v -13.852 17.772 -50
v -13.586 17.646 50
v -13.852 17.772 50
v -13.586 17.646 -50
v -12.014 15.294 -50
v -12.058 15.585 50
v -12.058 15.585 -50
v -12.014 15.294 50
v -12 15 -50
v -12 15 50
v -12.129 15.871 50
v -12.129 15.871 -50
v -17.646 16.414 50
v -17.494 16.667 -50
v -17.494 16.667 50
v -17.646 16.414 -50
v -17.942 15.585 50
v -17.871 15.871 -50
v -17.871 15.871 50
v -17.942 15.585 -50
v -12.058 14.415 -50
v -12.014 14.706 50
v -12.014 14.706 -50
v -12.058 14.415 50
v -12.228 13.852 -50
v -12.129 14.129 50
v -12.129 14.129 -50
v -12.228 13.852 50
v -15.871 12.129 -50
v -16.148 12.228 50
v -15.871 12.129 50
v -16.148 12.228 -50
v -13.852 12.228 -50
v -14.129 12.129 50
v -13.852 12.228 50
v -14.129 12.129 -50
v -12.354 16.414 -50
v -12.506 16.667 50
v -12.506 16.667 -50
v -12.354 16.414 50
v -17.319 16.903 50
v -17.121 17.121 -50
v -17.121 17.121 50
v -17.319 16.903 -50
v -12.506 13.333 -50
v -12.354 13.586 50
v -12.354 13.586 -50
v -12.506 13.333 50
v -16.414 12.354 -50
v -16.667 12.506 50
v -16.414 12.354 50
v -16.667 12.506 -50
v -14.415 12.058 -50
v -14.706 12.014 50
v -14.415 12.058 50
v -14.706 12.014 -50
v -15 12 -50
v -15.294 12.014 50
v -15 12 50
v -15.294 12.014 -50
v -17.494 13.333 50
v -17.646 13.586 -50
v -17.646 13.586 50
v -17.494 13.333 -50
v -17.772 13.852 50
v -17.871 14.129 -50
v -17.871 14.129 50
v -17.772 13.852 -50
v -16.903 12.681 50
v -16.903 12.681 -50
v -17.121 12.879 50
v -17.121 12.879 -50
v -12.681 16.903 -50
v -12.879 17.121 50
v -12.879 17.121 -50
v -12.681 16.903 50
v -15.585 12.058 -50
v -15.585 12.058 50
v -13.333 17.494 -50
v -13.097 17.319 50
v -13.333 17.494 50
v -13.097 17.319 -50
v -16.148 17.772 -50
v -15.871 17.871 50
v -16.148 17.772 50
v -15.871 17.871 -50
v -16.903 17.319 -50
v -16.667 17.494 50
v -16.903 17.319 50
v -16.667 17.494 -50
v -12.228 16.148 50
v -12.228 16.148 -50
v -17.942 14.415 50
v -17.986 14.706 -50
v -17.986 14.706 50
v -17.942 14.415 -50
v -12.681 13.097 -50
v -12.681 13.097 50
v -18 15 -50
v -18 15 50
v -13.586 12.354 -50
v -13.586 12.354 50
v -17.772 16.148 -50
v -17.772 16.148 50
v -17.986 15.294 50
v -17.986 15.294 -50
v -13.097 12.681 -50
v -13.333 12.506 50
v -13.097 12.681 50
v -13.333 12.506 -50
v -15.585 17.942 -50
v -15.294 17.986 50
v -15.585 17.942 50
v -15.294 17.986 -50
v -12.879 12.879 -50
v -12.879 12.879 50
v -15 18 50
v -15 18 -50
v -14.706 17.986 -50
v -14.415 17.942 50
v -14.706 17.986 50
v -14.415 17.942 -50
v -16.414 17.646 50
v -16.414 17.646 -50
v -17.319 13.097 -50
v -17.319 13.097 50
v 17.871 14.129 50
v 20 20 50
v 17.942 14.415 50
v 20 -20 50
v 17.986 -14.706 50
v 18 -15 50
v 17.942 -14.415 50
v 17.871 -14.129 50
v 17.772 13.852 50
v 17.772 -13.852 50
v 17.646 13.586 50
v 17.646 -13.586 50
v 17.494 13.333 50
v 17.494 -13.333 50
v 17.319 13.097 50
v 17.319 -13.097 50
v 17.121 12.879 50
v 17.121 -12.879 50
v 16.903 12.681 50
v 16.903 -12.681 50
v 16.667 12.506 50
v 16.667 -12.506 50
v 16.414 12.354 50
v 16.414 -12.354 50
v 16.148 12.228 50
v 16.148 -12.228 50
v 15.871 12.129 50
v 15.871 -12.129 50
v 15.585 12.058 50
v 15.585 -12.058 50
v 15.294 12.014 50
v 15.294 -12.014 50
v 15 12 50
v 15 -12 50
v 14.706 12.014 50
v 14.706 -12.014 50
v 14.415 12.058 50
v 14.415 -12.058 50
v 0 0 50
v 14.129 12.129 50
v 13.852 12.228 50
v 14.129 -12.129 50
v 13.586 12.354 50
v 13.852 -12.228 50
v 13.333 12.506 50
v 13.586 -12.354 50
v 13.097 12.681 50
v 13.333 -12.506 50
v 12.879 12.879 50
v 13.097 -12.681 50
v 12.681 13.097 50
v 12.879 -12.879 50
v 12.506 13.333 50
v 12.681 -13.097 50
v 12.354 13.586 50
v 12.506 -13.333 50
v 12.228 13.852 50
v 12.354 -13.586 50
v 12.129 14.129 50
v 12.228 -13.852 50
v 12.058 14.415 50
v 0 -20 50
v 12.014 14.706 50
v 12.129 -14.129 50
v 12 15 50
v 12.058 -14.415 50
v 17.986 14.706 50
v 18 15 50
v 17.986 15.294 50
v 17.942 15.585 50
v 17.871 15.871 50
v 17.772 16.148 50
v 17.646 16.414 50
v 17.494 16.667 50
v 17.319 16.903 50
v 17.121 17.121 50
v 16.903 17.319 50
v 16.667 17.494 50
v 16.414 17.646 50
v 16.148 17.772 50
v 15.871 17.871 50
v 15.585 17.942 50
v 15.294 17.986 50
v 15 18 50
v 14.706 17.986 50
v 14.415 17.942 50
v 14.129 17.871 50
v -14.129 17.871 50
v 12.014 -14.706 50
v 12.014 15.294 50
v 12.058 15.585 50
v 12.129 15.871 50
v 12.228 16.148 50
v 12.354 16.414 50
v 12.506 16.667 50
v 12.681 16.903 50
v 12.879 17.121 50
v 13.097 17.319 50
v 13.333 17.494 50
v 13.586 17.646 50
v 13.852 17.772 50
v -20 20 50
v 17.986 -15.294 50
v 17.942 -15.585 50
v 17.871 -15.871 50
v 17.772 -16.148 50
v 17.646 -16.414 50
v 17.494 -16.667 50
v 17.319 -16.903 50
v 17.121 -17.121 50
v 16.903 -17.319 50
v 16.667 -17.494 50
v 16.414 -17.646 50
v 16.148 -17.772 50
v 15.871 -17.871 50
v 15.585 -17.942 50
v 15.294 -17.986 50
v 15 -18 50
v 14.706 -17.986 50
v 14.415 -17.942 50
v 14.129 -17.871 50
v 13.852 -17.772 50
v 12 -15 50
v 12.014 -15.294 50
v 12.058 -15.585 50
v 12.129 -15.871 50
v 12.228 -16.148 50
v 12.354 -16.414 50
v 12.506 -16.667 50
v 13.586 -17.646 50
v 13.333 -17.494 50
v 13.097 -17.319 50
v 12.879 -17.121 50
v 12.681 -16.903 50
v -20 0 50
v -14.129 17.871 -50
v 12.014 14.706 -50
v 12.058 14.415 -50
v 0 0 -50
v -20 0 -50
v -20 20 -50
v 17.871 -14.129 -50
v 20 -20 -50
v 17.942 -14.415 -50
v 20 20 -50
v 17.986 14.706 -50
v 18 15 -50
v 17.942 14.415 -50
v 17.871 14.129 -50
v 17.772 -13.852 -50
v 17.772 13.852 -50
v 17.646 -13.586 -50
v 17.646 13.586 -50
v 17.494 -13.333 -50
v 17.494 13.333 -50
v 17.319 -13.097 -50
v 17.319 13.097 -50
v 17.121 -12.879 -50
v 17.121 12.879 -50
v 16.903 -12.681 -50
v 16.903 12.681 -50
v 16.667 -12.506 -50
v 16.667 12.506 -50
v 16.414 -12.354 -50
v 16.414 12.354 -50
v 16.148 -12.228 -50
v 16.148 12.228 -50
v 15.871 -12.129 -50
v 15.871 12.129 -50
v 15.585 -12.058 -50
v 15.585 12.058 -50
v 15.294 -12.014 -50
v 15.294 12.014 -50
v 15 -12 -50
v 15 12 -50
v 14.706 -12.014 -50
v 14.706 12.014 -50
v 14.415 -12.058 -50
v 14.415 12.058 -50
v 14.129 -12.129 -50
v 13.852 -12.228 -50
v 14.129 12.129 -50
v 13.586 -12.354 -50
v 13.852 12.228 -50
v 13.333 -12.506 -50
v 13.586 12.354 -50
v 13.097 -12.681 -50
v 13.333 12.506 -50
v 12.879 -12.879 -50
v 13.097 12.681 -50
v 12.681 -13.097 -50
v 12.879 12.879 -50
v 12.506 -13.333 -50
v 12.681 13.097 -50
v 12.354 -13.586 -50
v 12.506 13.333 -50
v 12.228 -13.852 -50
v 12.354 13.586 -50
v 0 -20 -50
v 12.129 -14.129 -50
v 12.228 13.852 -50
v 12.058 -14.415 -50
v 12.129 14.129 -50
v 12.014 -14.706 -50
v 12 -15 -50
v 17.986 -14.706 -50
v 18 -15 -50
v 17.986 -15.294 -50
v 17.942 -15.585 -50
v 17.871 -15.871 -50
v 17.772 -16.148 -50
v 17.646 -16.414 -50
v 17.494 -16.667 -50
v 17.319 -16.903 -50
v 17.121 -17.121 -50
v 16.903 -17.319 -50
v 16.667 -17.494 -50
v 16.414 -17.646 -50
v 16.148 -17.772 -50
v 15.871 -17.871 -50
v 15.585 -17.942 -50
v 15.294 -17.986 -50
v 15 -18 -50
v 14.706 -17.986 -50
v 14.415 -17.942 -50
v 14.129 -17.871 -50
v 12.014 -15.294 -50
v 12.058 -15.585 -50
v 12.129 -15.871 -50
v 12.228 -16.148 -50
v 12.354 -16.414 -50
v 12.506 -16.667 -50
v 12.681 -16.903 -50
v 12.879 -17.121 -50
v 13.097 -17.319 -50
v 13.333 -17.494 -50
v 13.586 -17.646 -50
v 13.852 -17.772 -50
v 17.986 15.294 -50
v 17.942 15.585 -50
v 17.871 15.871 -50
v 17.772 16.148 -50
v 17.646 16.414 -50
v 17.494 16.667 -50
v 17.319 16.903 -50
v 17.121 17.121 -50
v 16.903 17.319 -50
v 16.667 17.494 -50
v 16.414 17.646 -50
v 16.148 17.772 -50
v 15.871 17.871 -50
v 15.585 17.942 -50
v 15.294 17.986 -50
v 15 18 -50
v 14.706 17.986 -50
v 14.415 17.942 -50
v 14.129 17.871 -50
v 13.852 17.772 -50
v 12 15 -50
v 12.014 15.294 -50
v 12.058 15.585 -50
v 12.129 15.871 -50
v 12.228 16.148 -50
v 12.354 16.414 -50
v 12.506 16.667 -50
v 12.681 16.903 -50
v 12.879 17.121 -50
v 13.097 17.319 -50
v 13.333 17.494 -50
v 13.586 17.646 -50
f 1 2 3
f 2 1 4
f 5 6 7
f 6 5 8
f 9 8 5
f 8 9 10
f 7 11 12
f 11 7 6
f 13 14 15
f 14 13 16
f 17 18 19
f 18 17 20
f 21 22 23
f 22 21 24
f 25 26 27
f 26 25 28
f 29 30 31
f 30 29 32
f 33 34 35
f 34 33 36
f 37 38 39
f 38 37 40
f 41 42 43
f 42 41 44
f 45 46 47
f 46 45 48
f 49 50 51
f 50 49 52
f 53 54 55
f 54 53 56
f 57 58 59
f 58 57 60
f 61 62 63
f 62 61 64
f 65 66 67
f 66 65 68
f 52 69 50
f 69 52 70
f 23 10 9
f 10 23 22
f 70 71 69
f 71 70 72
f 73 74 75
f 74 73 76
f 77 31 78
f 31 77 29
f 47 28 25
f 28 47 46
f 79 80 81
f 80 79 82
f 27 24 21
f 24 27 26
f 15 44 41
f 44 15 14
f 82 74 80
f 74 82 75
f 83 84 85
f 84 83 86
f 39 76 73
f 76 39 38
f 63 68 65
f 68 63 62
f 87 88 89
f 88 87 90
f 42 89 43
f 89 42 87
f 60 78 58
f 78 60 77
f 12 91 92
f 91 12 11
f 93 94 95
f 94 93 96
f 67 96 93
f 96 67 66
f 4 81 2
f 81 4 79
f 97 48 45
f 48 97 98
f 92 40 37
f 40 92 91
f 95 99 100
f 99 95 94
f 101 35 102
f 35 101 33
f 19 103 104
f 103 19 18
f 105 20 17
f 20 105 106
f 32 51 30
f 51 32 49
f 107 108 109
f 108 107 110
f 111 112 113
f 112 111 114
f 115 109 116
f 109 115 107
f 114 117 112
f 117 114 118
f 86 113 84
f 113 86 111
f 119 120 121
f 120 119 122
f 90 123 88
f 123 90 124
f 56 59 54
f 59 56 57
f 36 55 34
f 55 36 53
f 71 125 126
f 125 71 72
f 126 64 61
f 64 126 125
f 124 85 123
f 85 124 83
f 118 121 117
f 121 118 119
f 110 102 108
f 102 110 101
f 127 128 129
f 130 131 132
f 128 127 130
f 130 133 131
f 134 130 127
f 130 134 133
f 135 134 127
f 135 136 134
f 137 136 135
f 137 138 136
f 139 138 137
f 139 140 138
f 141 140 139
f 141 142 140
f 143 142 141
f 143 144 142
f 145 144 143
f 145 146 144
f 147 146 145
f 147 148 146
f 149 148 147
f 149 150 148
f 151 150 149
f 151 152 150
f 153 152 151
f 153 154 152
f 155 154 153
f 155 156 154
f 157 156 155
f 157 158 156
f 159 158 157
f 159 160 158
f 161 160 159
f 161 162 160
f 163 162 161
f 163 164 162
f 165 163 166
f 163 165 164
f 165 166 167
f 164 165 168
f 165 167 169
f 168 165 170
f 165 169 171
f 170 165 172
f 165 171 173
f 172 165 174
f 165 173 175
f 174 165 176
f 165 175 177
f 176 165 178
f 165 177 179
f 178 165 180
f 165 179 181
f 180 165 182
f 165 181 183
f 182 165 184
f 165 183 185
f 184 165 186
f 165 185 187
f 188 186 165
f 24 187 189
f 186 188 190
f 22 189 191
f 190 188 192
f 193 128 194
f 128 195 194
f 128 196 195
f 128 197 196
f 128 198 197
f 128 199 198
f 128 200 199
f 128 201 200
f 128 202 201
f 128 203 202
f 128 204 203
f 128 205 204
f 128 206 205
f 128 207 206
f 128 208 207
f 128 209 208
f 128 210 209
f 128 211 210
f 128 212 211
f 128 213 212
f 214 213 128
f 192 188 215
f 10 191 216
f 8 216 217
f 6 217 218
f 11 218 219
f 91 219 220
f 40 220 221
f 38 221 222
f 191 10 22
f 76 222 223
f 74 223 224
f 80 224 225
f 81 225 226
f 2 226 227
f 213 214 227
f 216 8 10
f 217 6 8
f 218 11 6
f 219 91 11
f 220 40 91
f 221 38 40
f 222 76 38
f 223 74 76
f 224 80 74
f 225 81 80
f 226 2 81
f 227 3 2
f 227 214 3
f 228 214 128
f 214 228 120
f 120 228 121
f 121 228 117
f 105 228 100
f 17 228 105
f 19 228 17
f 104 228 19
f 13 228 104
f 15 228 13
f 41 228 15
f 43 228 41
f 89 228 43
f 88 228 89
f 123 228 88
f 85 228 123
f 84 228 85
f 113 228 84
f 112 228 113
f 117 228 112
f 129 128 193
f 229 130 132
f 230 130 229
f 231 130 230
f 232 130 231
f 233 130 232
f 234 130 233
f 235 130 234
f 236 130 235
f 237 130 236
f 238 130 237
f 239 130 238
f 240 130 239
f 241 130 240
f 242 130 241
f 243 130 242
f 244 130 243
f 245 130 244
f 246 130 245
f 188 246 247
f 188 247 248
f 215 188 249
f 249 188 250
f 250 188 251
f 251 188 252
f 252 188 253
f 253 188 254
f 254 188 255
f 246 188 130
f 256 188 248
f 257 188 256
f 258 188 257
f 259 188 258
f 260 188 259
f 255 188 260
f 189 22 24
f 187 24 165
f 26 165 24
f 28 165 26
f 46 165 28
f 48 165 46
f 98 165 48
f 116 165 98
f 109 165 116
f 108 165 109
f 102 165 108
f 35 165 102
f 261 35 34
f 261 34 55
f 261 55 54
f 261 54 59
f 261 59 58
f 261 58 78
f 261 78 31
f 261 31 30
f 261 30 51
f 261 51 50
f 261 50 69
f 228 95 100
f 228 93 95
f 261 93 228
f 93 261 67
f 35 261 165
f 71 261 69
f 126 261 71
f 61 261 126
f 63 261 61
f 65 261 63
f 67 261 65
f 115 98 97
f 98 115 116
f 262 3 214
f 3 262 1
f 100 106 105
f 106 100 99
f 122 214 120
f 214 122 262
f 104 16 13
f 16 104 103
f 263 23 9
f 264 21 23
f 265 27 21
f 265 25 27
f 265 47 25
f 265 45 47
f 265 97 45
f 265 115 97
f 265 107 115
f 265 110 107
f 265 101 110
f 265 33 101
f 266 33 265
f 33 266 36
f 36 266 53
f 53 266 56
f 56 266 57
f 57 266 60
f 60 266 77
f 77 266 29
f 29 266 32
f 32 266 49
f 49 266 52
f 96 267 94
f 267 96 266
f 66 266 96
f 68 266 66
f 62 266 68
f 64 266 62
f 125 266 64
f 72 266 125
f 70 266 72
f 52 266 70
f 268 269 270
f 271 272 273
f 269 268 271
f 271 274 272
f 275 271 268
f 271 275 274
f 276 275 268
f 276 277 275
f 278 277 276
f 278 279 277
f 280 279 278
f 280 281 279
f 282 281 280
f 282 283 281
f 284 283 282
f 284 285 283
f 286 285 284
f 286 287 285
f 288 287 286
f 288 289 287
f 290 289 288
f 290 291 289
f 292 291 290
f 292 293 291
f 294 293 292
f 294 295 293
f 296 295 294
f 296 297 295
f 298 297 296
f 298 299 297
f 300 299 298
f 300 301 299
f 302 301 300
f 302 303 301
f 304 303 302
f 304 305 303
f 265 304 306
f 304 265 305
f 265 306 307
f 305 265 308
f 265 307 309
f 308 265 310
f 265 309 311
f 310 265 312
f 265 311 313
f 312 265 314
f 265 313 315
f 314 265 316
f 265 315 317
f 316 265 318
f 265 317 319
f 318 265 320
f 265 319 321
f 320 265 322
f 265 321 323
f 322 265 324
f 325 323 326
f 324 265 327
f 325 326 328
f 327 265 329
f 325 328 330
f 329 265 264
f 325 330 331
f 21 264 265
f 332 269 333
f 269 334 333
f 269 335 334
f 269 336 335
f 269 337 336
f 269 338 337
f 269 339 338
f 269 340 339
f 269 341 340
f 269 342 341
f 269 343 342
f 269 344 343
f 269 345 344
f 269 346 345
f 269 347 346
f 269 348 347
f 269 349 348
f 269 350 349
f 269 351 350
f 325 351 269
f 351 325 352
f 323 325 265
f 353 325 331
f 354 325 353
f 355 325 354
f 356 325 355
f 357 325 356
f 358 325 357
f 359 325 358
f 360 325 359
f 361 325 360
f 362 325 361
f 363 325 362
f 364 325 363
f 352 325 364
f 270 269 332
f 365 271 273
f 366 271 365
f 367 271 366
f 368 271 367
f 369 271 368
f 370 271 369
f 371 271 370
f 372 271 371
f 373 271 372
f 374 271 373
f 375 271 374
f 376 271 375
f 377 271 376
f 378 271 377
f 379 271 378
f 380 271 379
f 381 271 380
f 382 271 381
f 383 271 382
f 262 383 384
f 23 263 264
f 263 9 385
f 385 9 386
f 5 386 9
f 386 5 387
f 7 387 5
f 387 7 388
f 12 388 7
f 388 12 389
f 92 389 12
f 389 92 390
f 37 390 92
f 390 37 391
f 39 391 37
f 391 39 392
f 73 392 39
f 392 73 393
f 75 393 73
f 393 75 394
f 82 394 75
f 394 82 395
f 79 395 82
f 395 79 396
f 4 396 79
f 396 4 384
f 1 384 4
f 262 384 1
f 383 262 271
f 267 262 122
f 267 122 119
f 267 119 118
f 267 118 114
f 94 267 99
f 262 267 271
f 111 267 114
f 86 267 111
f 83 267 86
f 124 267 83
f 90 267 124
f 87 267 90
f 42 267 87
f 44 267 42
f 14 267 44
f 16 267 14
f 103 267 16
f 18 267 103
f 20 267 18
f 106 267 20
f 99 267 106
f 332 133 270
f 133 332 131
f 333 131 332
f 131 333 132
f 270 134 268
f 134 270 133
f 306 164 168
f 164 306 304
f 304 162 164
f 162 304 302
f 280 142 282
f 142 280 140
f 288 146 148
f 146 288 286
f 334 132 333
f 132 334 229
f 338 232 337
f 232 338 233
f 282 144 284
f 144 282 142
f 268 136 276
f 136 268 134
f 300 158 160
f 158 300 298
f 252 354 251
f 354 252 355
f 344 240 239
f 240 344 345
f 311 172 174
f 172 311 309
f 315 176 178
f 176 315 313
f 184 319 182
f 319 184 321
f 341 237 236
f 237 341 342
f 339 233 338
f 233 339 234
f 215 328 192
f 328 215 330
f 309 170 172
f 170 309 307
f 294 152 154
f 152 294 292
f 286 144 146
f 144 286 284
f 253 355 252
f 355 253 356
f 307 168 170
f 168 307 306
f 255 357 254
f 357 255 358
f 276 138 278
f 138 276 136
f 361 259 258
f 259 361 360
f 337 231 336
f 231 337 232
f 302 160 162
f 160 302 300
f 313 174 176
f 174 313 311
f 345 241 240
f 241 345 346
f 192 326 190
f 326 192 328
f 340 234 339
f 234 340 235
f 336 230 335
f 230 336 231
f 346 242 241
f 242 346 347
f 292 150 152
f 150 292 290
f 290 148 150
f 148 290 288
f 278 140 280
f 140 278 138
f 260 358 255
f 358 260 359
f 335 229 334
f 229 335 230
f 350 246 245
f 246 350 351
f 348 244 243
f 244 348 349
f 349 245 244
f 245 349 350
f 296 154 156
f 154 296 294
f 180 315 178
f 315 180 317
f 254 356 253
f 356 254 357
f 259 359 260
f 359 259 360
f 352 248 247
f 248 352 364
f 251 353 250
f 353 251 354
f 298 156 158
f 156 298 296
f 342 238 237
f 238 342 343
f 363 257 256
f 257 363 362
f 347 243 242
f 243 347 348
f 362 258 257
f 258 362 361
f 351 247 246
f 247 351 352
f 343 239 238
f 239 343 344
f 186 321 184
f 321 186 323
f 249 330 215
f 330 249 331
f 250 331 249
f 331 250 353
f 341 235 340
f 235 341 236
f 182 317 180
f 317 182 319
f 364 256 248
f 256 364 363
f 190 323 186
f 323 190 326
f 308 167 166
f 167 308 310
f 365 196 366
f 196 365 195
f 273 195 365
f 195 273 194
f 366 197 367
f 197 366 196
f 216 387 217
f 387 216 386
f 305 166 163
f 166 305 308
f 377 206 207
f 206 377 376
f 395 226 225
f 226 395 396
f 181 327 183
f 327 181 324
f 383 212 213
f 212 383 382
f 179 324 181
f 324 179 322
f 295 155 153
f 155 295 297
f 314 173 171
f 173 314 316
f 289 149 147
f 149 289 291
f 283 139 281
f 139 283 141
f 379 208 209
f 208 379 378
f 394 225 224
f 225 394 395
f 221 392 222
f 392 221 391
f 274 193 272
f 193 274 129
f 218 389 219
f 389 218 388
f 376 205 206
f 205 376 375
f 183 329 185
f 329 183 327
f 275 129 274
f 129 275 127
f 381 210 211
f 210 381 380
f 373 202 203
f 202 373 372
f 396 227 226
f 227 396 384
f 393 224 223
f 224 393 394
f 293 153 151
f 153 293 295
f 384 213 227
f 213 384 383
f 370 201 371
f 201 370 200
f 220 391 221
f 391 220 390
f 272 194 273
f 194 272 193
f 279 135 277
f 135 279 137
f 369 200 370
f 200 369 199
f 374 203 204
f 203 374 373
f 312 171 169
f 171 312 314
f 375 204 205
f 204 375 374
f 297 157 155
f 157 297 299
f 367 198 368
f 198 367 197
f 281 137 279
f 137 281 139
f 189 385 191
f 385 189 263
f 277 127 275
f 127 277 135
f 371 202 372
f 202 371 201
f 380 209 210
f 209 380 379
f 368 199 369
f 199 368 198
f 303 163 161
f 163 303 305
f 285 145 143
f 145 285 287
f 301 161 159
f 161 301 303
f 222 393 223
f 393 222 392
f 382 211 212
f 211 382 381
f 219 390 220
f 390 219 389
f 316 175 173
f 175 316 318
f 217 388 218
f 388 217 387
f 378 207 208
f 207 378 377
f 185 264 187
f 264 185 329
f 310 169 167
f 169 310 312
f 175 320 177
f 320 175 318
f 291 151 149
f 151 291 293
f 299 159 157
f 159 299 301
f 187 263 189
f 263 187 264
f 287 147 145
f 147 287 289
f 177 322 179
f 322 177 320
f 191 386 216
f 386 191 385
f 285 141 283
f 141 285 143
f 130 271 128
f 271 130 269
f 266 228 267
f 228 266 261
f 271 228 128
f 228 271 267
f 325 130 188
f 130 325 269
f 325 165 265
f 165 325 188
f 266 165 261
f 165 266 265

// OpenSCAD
module aluminium_extrusion() {
    difference() {
        cube([40, 40, 100], center = true);
        translate([-18, -18, -1])
            cube([36, 36, 102], center = true);
        for (x = [-15, 15]) {
            for (y = [-15, 15]) {
                translate([x, y, 0])
                    cylinder(h = 100, r = 3, center = true, $fn = 64);
            }
        }
    }
}

aluminium_extrusion();
